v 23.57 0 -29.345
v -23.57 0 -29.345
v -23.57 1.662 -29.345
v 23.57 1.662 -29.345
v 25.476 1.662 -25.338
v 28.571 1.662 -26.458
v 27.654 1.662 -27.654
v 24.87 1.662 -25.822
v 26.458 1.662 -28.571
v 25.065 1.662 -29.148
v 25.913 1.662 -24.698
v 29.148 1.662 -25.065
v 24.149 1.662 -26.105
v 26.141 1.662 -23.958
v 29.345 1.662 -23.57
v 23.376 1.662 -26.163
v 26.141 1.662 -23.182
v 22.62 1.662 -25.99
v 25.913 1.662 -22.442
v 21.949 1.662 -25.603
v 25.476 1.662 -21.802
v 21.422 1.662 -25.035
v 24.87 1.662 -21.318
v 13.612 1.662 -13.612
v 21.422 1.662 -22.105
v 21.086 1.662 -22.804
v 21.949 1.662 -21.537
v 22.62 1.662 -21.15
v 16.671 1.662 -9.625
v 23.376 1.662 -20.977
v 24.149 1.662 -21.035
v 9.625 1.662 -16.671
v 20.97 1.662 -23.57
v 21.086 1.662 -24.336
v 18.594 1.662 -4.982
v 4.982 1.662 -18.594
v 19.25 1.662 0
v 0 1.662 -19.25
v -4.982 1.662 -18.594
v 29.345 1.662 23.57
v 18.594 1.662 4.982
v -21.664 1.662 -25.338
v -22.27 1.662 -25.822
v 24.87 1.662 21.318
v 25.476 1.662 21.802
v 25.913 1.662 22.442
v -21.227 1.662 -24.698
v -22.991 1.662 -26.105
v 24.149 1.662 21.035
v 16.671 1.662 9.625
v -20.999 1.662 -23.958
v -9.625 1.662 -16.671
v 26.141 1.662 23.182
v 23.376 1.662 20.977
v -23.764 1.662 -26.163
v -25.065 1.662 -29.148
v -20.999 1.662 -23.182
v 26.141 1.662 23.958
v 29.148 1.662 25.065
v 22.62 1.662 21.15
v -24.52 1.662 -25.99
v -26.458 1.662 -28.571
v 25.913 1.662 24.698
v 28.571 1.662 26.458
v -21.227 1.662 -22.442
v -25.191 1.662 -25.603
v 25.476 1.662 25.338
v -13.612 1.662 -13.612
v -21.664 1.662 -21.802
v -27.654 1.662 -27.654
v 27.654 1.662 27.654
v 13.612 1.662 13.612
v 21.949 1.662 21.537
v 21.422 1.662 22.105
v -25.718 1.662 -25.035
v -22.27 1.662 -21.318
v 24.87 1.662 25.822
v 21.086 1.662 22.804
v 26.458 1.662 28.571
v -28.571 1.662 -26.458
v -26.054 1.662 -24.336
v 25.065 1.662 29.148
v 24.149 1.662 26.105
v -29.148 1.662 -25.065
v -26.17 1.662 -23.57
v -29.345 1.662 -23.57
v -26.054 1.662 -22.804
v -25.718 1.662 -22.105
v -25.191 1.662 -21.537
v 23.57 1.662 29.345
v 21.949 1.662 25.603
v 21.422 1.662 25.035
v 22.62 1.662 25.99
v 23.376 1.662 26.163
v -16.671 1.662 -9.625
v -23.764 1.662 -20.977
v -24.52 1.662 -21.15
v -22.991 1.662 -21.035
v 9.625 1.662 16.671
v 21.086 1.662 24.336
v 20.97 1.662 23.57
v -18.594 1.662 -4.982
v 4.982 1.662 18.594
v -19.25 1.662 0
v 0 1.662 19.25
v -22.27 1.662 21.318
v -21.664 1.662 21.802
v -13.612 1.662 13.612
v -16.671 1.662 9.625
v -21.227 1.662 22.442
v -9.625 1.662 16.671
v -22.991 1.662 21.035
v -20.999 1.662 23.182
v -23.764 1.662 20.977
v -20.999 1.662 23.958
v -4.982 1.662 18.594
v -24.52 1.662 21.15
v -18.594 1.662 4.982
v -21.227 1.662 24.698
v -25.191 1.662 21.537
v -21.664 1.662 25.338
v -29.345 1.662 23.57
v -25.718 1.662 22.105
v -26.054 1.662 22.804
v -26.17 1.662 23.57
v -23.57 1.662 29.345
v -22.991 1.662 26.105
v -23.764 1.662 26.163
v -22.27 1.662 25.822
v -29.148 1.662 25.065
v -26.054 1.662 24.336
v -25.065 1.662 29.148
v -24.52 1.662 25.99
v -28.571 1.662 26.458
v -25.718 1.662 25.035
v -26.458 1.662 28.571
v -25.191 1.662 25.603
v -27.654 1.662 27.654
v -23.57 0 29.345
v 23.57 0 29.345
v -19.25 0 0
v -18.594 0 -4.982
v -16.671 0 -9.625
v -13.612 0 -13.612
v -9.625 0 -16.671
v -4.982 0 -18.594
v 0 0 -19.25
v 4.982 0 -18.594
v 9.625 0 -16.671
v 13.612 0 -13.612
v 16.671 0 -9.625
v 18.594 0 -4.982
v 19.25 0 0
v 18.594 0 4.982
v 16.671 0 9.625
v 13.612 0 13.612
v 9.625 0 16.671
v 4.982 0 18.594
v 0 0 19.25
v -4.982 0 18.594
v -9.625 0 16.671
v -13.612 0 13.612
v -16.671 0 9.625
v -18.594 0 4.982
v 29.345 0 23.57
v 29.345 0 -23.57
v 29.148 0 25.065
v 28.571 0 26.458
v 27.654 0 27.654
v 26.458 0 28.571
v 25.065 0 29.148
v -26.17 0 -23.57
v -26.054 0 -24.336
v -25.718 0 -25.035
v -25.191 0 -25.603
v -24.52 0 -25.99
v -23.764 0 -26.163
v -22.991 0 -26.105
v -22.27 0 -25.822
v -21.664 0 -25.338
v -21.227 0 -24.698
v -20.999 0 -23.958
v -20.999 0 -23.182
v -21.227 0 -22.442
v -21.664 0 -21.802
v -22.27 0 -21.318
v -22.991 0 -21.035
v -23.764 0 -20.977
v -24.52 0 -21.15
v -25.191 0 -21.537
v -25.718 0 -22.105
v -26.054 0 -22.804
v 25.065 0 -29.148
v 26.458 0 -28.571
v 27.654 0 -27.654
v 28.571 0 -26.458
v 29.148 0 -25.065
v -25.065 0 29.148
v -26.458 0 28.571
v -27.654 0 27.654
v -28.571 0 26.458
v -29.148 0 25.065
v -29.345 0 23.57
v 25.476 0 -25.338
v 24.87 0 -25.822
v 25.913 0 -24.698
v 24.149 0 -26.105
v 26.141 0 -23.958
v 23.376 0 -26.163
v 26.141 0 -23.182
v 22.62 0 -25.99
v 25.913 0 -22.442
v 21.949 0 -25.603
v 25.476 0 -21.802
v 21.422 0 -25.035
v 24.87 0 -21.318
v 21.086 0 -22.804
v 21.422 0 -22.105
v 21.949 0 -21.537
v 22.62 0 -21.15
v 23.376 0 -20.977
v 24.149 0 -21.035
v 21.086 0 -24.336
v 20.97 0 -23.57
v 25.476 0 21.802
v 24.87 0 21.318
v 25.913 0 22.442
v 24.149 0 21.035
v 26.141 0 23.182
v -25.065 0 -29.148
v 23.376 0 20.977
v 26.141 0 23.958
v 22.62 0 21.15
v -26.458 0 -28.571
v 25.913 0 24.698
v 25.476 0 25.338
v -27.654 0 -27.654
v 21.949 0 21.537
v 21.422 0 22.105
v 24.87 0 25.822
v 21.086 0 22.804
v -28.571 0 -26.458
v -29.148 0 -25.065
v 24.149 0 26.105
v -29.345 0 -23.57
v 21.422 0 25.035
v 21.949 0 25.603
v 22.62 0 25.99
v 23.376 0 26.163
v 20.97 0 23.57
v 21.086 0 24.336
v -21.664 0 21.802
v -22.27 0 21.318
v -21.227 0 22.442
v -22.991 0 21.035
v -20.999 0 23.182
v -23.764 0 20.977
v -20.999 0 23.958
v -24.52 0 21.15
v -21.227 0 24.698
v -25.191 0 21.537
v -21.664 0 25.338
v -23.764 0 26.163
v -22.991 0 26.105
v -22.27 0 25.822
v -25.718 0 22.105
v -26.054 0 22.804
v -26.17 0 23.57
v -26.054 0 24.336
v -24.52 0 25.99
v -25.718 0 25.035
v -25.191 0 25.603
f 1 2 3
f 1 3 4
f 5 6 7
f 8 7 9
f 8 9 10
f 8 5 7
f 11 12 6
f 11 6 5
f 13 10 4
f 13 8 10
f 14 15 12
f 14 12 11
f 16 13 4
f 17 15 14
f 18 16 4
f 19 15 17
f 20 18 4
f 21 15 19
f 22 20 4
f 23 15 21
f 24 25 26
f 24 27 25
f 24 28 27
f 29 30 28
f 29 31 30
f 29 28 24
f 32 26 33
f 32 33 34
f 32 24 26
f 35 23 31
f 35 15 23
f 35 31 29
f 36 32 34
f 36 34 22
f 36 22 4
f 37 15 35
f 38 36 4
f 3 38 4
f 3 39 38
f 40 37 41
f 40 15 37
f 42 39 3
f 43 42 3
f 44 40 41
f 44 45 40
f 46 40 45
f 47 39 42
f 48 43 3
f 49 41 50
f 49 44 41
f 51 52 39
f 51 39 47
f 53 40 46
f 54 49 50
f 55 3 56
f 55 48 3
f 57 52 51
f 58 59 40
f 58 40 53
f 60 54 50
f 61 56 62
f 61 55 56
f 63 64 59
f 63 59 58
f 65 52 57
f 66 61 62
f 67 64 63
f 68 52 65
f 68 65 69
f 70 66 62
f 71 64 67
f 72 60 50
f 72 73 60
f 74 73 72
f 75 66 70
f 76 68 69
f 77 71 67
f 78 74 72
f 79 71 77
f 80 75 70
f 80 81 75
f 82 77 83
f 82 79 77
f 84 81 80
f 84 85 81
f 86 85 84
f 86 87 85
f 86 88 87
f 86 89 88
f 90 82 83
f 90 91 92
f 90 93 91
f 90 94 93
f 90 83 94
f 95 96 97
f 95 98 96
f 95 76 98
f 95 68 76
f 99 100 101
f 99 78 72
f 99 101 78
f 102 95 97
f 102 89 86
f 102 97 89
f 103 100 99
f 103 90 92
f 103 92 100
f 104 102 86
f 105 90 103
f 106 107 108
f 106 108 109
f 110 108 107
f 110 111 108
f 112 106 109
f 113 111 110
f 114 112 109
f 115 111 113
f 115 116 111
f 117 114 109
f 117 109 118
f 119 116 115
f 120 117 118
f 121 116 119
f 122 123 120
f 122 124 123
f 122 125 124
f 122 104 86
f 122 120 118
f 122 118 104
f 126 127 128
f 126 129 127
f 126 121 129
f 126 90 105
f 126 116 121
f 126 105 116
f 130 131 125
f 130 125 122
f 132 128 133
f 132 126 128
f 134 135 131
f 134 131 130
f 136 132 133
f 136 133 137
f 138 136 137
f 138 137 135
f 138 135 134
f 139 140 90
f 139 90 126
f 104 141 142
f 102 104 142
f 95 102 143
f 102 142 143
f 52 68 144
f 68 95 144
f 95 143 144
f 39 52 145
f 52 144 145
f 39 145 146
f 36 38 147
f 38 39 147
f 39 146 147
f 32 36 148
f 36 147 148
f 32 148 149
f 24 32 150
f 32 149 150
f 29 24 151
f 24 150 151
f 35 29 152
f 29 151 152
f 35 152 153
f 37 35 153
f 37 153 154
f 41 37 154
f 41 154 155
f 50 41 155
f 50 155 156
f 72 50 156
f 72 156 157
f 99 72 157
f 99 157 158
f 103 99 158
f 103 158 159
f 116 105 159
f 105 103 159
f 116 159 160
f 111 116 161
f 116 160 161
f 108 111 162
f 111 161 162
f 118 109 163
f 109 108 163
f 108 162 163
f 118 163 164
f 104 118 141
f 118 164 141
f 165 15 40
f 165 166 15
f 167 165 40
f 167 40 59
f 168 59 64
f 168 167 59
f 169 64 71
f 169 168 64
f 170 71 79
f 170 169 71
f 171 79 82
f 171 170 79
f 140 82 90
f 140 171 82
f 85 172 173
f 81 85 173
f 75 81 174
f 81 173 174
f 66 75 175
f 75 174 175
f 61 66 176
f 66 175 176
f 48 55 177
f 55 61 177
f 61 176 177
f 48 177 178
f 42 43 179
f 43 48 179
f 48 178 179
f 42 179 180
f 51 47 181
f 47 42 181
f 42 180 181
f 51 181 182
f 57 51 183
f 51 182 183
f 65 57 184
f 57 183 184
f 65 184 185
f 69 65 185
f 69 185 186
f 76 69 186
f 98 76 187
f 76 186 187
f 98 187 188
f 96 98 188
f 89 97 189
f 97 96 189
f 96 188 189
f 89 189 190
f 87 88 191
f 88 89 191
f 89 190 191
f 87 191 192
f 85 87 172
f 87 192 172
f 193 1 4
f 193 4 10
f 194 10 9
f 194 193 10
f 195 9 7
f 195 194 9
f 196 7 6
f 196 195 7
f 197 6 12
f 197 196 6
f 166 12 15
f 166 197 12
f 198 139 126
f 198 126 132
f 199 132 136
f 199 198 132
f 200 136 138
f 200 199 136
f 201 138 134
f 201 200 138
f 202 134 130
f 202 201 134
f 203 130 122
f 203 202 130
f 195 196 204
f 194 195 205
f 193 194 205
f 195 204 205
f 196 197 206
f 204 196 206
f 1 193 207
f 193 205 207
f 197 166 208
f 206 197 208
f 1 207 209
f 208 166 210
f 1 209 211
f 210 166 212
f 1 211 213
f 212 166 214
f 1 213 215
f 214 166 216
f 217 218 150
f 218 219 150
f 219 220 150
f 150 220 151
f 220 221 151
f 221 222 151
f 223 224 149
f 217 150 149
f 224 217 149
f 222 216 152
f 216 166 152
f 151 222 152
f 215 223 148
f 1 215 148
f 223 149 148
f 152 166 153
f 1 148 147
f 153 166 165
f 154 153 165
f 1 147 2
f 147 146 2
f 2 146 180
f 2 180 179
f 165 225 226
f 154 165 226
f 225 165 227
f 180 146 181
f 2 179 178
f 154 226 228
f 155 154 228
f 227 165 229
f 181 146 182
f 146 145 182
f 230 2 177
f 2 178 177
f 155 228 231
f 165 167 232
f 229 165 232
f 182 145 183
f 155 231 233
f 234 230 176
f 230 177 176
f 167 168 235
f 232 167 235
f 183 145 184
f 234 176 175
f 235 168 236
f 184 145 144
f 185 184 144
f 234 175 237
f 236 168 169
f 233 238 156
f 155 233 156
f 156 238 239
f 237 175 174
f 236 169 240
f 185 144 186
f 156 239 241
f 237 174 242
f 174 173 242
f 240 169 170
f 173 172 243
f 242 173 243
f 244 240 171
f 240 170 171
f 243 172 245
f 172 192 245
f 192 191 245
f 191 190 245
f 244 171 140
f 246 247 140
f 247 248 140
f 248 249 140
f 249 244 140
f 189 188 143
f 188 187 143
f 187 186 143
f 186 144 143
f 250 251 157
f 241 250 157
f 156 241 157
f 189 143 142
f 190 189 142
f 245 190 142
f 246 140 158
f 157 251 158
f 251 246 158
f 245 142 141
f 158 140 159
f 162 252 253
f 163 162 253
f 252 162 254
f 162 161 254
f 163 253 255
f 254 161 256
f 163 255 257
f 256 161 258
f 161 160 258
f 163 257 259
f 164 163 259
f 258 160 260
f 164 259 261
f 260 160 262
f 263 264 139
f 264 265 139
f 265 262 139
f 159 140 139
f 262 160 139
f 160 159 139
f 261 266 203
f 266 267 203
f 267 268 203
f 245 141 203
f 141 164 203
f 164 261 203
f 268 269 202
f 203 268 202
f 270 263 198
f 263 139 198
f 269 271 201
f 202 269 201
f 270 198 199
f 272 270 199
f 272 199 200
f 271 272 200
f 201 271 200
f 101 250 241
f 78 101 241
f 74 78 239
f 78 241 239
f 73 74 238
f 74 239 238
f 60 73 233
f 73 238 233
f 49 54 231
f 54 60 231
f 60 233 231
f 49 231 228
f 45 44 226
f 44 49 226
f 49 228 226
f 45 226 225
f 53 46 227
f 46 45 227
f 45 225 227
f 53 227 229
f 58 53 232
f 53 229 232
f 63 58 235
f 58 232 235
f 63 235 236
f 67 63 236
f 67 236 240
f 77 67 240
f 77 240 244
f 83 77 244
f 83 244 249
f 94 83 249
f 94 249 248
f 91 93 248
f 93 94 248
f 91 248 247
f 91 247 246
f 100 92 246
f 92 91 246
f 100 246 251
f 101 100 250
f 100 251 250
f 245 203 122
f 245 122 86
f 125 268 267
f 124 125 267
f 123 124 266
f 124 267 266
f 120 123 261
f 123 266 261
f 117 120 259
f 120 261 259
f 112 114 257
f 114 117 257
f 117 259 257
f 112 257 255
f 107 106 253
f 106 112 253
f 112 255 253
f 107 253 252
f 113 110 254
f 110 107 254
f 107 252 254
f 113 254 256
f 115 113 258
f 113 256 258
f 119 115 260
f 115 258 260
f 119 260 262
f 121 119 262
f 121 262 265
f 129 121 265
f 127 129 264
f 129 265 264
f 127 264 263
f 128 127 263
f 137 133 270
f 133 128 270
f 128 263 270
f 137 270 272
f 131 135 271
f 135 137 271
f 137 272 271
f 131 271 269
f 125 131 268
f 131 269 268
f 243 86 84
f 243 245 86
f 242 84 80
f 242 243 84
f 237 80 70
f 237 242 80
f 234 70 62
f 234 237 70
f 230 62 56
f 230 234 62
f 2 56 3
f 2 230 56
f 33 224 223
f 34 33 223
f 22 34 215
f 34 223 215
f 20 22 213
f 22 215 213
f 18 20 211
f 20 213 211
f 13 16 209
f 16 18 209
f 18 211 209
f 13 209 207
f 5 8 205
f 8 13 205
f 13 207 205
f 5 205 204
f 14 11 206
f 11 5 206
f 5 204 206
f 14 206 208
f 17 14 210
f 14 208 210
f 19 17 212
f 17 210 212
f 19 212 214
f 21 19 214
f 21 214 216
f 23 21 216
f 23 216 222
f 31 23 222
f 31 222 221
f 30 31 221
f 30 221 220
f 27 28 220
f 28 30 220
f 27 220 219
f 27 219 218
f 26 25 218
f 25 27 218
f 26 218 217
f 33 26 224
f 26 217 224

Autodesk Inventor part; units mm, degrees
ref_plane "YZ Plane" through (0, 0, 0) normal (1, 0, 0) x (0, 1, 0)
ref_plane "XZ Plane" through (0, 0, 0) normal (0, 1, 0) x (-1, 0, 0)
ref_plane "XY Plane" through (0, 0, 0) normal (0, 0, 1) x (1, 0, 0)
sketch "Sketch1" plane through (0, 0, 0) normal (0, 1, 0) x (-1, 0, 0)
  circle A0 centre (0, 0) radius 19.25
  circle A1 centre (23.57, -23.57) radius 2.6
  circle A2 centre (23.57, 23.57) radius 2.6
  circle A3 centre (-23.57, 23.57) radius 2.6
  circle A4 centre (-23.57, -23.57) radius 2.6
  circle A5 centre (23.57, 23.57) radius 5.775 construction
  circle A6 centre (23.57, -23.57) radius 5.775 construction
  circle A7 centre (-23.57, -23.57) radius 5.775 construction
  circle A8 centre (-23.57, 23.57) radius 5.775 construction
  line L0 (29.345, 23.57) -> (29.345, -23.57)
  line L1 (23.57, -29.345) -> (-23.57, -29.345)
  line L2 (-29.345, -23.57) -> (-29.345, 23.57)
  line L3 (-23.57, 29.345) -> (23.57, 29.345)
  arc A9 (-29.345, -23.57) -> (-23.57, -29.345) centre (-23.57, -23.57) ccw
  arc A10 (-23.57, 29.345) -> (-29.345, 23.57) centre (-23.57, 23.57) ccw
  arc A11 (23.57, -29.345) -> (29.345, -23.57) centre (23.57, -23.57) ccw
  arc A12 (29.345, 23.57) -> (23.57, 29.345) centre (23.57, 23.57) ccw
  dimension "d0" = 38.5
  dimension "d1" = 5.2
  dimension "d2" = 23.57
  dimension "d3" = 23.57
  dimension "d4" = 23.57
  dimension "d5" = 23.57
  dimension "d6" = 3.175
extrude "Extrusion1" add sketch "Sketch1" along normal blind 1.6625
properties part number "CNC-004-Nema23Shim" material "ABS Plastic"
